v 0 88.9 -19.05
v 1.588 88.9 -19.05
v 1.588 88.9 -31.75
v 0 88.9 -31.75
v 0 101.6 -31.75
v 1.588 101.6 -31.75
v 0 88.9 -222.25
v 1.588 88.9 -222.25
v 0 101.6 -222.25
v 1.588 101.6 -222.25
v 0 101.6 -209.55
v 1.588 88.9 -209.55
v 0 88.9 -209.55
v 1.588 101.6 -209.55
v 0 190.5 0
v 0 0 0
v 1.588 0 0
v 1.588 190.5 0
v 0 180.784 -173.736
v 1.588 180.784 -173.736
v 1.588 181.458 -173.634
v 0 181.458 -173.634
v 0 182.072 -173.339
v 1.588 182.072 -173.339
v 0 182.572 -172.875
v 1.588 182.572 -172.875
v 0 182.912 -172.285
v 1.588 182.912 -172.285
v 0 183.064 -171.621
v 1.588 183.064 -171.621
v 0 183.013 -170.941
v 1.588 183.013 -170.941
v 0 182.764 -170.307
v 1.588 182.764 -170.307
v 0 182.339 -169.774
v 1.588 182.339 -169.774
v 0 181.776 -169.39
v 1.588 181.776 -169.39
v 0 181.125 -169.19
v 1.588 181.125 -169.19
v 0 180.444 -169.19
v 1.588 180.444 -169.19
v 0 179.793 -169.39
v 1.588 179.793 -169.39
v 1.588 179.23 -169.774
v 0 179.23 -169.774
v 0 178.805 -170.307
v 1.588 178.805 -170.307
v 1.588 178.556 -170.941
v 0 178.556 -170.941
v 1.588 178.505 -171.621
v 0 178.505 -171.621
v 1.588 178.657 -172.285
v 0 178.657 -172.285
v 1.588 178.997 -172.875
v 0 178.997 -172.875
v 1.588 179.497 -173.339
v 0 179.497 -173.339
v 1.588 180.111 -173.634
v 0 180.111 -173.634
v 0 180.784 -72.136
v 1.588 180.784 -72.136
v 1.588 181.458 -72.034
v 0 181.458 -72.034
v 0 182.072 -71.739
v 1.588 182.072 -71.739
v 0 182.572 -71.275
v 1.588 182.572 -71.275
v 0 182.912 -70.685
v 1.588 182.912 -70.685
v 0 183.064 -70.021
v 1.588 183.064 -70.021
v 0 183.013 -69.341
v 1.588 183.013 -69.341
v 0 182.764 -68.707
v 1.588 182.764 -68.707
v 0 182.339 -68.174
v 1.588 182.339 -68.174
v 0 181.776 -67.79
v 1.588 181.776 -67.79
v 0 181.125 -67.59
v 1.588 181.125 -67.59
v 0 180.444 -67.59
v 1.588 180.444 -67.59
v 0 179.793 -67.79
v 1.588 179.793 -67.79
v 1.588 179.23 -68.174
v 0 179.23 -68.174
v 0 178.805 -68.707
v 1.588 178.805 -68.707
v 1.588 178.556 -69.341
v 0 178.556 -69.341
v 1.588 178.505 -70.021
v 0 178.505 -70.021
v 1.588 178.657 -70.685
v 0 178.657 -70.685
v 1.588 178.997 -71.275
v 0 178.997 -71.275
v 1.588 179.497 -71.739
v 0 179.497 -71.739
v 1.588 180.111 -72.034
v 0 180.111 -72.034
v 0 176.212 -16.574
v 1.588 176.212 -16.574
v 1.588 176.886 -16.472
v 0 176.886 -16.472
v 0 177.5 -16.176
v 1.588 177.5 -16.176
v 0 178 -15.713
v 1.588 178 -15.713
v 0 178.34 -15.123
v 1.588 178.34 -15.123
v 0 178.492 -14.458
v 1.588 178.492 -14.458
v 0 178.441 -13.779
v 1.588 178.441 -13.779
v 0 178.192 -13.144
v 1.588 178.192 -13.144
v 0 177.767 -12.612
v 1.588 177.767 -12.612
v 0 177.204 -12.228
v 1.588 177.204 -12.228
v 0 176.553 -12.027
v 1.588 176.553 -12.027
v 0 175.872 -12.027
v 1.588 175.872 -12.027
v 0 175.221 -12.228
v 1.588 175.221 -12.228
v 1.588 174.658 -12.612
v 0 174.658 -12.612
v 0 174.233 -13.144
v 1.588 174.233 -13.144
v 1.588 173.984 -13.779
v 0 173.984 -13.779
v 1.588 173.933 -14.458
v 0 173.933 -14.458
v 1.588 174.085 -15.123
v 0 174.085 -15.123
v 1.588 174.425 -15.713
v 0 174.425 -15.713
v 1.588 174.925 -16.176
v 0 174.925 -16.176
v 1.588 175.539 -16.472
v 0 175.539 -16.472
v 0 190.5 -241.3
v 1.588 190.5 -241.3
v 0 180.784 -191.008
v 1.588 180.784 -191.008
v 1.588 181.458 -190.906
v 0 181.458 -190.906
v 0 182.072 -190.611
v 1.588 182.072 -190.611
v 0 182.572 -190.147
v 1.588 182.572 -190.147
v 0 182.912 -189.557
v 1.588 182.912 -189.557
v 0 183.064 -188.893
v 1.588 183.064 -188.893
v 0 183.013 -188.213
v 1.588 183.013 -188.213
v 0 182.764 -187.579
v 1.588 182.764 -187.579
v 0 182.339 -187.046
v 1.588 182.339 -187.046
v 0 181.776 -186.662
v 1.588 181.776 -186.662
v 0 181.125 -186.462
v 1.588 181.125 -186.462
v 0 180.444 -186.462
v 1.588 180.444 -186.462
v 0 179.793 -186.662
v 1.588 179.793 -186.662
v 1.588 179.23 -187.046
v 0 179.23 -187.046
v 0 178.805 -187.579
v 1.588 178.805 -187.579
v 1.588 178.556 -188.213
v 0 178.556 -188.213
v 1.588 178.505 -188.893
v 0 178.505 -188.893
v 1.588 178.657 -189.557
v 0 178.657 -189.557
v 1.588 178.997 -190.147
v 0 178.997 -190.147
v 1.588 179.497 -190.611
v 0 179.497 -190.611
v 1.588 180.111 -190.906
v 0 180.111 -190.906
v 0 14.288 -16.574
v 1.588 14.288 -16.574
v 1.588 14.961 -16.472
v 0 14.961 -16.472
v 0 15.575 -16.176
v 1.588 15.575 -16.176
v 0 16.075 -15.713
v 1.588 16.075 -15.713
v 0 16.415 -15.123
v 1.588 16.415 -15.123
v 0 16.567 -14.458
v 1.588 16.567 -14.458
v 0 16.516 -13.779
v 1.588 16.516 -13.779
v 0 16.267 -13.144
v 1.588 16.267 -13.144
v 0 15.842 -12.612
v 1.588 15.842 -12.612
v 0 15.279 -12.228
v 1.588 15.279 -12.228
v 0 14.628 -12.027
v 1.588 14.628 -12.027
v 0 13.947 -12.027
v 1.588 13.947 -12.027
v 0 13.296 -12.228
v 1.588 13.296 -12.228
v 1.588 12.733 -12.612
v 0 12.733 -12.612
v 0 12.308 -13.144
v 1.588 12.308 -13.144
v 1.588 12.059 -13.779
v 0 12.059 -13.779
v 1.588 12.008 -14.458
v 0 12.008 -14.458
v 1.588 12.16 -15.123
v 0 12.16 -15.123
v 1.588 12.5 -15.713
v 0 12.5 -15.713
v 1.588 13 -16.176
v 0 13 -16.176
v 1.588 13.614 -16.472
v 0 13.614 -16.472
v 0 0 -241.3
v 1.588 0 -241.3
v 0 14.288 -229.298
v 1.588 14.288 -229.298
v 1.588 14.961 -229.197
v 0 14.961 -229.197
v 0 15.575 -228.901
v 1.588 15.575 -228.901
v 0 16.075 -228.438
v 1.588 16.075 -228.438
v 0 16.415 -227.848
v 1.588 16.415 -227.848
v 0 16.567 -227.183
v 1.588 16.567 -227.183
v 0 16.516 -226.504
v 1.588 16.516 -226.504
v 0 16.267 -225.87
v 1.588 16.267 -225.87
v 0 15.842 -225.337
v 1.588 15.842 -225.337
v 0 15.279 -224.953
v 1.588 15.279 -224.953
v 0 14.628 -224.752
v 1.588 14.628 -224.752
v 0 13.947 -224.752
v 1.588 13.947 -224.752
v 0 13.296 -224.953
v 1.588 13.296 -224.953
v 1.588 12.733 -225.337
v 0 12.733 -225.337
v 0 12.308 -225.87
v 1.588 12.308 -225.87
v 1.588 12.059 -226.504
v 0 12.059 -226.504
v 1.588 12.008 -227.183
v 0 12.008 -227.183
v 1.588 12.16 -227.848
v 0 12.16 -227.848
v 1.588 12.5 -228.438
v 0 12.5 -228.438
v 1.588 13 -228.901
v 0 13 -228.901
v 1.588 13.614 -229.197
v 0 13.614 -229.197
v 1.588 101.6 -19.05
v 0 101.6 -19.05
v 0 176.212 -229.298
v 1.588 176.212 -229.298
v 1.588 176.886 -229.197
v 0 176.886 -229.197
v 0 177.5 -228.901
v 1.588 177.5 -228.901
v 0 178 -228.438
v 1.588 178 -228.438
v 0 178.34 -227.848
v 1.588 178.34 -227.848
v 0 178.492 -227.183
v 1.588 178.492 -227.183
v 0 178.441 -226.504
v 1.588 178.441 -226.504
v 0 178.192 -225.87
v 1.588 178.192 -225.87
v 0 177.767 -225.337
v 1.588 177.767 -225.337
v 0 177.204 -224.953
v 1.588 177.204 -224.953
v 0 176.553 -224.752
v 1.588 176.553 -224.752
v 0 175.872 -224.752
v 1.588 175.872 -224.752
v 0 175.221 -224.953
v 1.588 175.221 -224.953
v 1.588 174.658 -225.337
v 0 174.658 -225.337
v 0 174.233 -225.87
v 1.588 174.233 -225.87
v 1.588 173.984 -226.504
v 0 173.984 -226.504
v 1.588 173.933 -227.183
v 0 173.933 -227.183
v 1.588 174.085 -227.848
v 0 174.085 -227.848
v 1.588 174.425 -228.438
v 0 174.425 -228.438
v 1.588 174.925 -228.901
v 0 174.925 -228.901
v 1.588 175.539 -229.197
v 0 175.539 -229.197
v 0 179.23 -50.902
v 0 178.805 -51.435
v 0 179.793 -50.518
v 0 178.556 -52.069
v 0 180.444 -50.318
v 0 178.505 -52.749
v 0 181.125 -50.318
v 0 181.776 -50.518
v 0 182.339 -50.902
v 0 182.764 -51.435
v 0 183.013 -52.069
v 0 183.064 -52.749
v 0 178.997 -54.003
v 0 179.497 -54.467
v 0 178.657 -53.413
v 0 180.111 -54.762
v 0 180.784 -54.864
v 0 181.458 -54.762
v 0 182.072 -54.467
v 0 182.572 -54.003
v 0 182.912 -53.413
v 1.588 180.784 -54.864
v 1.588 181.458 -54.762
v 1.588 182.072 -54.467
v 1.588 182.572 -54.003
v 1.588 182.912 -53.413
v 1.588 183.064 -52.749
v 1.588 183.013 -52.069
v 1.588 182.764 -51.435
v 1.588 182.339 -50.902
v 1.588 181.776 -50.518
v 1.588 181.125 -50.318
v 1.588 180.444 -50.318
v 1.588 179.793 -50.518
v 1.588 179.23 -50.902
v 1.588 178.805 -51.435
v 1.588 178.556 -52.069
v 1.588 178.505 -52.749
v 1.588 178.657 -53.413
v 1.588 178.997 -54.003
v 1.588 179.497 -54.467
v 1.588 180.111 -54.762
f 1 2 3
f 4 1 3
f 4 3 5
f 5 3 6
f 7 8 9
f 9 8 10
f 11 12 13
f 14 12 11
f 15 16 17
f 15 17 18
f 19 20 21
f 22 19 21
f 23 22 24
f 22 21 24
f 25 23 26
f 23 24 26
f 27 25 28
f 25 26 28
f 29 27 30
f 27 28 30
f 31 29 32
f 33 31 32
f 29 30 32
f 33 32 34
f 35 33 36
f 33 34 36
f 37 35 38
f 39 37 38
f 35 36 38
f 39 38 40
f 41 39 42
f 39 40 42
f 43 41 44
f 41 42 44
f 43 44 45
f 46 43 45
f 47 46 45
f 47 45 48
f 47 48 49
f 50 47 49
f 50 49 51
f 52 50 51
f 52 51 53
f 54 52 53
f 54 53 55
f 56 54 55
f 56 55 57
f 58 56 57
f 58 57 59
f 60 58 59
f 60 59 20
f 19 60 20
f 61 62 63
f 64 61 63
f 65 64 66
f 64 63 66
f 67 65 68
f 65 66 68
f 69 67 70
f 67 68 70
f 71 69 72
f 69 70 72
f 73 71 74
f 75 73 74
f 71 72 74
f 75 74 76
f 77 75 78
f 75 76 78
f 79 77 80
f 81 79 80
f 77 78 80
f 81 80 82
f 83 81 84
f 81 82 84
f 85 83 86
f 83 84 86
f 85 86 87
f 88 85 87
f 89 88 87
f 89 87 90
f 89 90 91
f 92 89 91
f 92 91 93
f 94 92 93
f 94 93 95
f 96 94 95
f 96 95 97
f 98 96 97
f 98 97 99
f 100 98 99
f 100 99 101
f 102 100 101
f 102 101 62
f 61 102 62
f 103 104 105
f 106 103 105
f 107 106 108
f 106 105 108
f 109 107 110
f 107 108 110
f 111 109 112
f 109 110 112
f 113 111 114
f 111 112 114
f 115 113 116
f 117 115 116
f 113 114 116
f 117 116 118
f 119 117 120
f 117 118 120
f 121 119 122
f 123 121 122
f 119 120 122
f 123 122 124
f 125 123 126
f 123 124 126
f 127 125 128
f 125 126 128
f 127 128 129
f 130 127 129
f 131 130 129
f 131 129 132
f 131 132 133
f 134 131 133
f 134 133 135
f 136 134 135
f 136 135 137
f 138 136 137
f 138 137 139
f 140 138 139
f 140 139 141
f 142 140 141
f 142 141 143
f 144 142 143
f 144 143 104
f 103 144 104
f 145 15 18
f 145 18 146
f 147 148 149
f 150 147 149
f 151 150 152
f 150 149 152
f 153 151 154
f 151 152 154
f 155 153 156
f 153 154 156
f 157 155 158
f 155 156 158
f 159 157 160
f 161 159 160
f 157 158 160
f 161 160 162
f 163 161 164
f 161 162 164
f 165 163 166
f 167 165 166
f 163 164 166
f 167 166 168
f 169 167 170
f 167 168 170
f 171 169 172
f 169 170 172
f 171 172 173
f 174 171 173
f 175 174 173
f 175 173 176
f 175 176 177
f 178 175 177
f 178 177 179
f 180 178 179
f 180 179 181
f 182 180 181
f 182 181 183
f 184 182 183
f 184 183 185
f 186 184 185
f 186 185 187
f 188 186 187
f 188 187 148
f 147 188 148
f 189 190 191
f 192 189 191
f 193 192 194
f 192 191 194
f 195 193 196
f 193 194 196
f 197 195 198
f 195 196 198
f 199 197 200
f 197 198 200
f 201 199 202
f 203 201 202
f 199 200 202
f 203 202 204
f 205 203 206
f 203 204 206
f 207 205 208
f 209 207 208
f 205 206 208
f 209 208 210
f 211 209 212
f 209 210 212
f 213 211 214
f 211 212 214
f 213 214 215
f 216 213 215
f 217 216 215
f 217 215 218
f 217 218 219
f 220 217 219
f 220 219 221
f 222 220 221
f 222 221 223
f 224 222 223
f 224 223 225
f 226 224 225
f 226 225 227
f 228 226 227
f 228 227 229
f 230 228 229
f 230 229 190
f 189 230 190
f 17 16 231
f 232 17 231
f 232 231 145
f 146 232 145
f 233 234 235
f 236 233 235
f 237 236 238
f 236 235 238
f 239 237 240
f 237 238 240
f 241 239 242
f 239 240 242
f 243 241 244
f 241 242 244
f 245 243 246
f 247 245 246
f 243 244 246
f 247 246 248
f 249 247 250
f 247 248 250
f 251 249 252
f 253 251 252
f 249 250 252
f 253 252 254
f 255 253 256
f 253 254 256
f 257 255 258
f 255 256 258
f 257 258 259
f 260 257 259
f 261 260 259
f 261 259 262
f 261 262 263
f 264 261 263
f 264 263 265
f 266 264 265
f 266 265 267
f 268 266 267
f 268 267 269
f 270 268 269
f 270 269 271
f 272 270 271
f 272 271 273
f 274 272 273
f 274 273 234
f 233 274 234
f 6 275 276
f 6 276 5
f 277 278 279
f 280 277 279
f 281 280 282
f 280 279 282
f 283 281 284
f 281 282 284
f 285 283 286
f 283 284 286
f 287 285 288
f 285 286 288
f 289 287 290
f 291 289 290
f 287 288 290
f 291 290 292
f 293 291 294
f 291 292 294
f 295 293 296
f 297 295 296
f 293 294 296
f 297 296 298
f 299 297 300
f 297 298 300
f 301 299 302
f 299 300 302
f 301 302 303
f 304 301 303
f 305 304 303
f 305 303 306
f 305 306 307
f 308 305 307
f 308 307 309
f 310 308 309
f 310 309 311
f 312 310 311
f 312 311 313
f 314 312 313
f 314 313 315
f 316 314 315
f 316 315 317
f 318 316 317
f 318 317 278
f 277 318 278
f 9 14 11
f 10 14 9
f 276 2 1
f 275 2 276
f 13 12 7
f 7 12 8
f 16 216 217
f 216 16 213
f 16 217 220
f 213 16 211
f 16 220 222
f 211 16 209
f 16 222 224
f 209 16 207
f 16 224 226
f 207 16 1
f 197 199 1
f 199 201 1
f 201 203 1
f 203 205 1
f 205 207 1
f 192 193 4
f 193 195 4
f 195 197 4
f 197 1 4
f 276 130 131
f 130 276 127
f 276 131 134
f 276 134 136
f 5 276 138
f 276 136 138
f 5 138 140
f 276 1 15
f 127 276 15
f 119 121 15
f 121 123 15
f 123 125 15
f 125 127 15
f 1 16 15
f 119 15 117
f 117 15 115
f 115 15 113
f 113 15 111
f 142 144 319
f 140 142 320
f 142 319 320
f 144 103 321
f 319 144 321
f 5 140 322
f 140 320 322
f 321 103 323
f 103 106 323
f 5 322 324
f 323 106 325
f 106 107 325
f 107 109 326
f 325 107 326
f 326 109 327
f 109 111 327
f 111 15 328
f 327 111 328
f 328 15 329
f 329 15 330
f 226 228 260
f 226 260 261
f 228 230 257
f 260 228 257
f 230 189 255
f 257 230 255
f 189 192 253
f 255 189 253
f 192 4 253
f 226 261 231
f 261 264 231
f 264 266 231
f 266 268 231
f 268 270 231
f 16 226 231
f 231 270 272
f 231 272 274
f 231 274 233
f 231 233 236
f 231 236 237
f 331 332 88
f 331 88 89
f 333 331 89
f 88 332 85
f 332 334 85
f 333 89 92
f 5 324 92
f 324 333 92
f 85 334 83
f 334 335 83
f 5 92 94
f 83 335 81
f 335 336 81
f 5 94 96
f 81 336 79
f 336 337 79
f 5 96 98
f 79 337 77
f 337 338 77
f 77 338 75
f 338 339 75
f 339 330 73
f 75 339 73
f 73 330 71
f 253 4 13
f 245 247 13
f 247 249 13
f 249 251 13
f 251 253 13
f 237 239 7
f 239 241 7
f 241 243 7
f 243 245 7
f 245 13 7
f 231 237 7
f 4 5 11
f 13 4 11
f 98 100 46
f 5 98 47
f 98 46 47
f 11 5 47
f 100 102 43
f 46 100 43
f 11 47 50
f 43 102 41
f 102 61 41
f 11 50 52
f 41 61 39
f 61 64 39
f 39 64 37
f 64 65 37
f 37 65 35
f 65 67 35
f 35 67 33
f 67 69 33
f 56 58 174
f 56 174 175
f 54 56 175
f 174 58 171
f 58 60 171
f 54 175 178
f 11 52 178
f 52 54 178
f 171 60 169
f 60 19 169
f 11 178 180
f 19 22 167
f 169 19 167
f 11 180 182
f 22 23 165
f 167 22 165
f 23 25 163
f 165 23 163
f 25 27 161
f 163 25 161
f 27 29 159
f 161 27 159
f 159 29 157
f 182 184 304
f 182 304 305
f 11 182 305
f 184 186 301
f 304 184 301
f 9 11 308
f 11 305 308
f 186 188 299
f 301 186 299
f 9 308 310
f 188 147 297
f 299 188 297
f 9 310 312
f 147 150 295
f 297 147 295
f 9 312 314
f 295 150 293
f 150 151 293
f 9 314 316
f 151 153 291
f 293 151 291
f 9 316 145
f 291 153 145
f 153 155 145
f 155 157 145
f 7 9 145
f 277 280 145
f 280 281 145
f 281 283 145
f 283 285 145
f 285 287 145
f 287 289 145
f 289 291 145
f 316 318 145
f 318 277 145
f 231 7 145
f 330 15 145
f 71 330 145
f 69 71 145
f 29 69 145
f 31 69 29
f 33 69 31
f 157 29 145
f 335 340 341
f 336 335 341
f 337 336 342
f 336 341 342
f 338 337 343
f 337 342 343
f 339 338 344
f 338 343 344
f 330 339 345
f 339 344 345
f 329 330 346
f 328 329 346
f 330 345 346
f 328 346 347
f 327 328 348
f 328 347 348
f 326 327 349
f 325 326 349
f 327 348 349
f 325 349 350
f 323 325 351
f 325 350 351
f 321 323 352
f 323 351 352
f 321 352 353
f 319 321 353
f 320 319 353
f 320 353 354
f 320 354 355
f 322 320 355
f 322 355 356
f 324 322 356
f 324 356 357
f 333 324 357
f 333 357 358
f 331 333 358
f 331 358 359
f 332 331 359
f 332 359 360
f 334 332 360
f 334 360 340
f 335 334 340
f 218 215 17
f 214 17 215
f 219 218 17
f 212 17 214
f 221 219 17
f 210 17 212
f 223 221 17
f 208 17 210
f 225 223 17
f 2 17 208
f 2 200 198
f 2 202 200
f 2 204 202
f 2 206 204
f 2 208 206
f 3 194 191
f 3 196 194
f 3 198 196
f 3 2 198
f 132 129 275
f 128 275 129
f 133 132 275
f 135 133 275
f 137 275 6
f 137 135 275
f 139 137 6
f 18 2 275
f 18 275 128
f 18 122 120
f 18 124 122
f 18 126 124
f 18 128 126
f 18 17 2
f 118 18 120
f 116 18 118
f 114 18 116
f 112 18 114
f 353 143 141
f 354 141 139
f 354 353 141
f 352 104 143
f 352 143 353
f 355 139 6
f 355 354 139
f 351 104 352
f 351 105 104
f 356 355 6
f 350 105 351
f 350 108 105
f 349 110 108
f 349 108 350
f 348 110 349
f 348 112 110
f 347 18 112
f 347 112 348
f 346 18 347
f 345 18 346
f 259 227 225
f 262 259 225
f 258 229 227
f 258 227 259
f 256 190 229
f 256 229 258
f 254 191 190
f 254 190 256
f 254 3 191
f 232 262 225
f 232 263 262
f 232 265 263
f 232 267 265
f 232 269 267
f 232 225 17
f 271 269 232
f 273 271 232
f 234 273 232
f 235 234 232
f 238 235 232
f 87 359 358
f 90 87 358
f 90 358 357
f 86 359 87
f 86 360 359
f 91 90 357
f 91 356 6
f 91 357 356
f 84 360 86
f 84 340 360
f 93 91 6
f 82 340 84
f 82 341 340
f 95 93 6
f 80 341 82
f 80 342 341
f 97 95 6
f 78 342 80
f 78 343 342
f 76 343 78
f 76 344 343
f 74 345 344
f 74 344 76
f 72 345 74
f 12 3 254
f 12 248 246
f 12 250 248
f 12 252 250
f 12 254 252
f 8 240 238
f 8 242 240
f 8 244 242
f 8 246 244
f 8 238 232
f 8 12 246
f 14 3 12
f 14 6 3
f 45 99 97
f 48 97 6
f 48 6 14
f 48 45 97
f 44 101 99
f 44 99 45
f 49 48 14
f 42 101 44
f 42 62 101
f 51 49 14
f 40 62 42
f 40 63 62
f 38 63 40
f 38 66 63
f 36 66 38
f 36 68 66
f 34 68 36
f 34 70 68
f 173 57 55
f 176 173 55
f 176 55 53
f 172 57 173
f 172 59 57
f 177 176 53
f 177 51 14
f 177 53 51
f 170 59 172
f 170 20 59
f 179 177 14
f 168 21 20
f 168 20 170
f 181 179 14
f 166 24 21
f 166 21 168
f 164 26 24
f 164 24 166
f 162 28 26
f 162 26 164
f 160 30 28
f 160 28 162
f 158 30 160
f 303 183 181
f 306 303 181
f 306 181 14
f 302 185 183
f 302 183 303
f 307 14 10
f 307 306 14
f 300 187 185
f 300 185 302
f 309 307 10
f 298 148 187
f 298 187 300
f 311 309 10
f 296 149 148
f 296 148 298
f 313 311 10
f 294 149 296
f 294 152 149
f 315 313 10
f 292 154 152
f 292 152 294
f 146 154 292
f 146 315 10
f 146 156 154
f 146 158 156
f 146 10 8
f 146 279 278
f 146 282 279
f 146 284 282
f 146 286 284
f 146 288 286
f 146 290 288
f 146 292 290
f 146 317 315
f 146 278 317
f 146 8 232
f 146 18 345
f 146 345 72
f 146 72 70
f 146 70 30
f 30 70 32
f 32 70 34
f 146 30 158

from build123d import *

# Parameters (mm, degrees)
SKETCH1_W           = 241.3
SKETCH1_H           = 190.5
BOSS_EXTRUDE1_DEPTH = 1.5875
SKETCH2_R           = 2.286
CUT_EXTRUDE1_DEPTH  = 2.5875
SKETCH3_R           = 2.286
CUT_EXTRUDE2_DEPTH  = 2.5875
SKETCH4_W           = 12.7
SKETCH4_H           = 12.7
CUT_EXTRUDE3_DEPTH  = 2.5875


with BuildPart() as part:
    # Sketch1 → Boss-Extrude1 (new body)
    with BuildSketch(Plane(origin=(0, 0, 0), x_dir=(0, 0, -1), z_dir=(1, 0, 0))):
        with Locations((120.65, 95.25)):
            Rectangle(SKETCH1_W, SKETCH1_H)
    extrude(amount=BOSS_EXTRUDE1_DEPTH)

    # Sketch2 → Cut-Extrude1 (cut, through all)
    with BuildSketch(Plane(origin=(1.5875, 0, 0), x_dir=(0, 0, -1), z_dir=(1, 0, 0))):
        with Locations((227.0125, 14.2875)):
            Circle(SKETCH2_R)
        with Locations((227.0125, 176.2125)):
            Circle(SKETCH2_R)
        with Locations((14.2875, 14.2875)):
            Circle(SKETCH2_R)
        with Locations((14.2875, 176.2125)):
            Circle(SKETCH2_R)
    extrude(amount=-CUT_EXTRUDE1_DEPTH, mode=Mode.SUBTRACT)

    # Sketch3 → Cut-Extrude2 (cut, through all)
    with BuildSketch(Plane(origin=(1.5875, 0, 0), x_dir=(0, 0, -1), z_dir=(1, 0, 0))):
        with Locations((52.578, 180.7845)):
            Circle(SKETCH3_R)
        with Locations((69.85, 180.7845)):
            Circle(SKETCH3_R)
        with Locations((171.45, 180.7845)):
            Circle(SKETCH3_R)
        with Locations((188.722, 180.7845)):
            Circle(SKETCH3_R)
    extrude(amount=-CUT_EXTRUDE2_DEPTH, mode=Mode.SUBTRACT)

    # Sketch4 → Cut-Extrude3 (cut, through all)
    with BuildSketch(Plane(origin=(1.5875, 0, 0), x_dir=(0, 0, -1), z_dir=(1, 0, 0))):
        with Locations((25.4, 95.25)):
            Rectangle(SKETCH4_W, SKETCH4_H)
        with Locations((215.9, 95.25)):
            Rectangle(SKETCH4_W, SKETCH4_H)
    extrude(amount=-CUT_EXTRUDE3_DEPTH, mode=Mode.SUBTRACT)


solid = part.part
